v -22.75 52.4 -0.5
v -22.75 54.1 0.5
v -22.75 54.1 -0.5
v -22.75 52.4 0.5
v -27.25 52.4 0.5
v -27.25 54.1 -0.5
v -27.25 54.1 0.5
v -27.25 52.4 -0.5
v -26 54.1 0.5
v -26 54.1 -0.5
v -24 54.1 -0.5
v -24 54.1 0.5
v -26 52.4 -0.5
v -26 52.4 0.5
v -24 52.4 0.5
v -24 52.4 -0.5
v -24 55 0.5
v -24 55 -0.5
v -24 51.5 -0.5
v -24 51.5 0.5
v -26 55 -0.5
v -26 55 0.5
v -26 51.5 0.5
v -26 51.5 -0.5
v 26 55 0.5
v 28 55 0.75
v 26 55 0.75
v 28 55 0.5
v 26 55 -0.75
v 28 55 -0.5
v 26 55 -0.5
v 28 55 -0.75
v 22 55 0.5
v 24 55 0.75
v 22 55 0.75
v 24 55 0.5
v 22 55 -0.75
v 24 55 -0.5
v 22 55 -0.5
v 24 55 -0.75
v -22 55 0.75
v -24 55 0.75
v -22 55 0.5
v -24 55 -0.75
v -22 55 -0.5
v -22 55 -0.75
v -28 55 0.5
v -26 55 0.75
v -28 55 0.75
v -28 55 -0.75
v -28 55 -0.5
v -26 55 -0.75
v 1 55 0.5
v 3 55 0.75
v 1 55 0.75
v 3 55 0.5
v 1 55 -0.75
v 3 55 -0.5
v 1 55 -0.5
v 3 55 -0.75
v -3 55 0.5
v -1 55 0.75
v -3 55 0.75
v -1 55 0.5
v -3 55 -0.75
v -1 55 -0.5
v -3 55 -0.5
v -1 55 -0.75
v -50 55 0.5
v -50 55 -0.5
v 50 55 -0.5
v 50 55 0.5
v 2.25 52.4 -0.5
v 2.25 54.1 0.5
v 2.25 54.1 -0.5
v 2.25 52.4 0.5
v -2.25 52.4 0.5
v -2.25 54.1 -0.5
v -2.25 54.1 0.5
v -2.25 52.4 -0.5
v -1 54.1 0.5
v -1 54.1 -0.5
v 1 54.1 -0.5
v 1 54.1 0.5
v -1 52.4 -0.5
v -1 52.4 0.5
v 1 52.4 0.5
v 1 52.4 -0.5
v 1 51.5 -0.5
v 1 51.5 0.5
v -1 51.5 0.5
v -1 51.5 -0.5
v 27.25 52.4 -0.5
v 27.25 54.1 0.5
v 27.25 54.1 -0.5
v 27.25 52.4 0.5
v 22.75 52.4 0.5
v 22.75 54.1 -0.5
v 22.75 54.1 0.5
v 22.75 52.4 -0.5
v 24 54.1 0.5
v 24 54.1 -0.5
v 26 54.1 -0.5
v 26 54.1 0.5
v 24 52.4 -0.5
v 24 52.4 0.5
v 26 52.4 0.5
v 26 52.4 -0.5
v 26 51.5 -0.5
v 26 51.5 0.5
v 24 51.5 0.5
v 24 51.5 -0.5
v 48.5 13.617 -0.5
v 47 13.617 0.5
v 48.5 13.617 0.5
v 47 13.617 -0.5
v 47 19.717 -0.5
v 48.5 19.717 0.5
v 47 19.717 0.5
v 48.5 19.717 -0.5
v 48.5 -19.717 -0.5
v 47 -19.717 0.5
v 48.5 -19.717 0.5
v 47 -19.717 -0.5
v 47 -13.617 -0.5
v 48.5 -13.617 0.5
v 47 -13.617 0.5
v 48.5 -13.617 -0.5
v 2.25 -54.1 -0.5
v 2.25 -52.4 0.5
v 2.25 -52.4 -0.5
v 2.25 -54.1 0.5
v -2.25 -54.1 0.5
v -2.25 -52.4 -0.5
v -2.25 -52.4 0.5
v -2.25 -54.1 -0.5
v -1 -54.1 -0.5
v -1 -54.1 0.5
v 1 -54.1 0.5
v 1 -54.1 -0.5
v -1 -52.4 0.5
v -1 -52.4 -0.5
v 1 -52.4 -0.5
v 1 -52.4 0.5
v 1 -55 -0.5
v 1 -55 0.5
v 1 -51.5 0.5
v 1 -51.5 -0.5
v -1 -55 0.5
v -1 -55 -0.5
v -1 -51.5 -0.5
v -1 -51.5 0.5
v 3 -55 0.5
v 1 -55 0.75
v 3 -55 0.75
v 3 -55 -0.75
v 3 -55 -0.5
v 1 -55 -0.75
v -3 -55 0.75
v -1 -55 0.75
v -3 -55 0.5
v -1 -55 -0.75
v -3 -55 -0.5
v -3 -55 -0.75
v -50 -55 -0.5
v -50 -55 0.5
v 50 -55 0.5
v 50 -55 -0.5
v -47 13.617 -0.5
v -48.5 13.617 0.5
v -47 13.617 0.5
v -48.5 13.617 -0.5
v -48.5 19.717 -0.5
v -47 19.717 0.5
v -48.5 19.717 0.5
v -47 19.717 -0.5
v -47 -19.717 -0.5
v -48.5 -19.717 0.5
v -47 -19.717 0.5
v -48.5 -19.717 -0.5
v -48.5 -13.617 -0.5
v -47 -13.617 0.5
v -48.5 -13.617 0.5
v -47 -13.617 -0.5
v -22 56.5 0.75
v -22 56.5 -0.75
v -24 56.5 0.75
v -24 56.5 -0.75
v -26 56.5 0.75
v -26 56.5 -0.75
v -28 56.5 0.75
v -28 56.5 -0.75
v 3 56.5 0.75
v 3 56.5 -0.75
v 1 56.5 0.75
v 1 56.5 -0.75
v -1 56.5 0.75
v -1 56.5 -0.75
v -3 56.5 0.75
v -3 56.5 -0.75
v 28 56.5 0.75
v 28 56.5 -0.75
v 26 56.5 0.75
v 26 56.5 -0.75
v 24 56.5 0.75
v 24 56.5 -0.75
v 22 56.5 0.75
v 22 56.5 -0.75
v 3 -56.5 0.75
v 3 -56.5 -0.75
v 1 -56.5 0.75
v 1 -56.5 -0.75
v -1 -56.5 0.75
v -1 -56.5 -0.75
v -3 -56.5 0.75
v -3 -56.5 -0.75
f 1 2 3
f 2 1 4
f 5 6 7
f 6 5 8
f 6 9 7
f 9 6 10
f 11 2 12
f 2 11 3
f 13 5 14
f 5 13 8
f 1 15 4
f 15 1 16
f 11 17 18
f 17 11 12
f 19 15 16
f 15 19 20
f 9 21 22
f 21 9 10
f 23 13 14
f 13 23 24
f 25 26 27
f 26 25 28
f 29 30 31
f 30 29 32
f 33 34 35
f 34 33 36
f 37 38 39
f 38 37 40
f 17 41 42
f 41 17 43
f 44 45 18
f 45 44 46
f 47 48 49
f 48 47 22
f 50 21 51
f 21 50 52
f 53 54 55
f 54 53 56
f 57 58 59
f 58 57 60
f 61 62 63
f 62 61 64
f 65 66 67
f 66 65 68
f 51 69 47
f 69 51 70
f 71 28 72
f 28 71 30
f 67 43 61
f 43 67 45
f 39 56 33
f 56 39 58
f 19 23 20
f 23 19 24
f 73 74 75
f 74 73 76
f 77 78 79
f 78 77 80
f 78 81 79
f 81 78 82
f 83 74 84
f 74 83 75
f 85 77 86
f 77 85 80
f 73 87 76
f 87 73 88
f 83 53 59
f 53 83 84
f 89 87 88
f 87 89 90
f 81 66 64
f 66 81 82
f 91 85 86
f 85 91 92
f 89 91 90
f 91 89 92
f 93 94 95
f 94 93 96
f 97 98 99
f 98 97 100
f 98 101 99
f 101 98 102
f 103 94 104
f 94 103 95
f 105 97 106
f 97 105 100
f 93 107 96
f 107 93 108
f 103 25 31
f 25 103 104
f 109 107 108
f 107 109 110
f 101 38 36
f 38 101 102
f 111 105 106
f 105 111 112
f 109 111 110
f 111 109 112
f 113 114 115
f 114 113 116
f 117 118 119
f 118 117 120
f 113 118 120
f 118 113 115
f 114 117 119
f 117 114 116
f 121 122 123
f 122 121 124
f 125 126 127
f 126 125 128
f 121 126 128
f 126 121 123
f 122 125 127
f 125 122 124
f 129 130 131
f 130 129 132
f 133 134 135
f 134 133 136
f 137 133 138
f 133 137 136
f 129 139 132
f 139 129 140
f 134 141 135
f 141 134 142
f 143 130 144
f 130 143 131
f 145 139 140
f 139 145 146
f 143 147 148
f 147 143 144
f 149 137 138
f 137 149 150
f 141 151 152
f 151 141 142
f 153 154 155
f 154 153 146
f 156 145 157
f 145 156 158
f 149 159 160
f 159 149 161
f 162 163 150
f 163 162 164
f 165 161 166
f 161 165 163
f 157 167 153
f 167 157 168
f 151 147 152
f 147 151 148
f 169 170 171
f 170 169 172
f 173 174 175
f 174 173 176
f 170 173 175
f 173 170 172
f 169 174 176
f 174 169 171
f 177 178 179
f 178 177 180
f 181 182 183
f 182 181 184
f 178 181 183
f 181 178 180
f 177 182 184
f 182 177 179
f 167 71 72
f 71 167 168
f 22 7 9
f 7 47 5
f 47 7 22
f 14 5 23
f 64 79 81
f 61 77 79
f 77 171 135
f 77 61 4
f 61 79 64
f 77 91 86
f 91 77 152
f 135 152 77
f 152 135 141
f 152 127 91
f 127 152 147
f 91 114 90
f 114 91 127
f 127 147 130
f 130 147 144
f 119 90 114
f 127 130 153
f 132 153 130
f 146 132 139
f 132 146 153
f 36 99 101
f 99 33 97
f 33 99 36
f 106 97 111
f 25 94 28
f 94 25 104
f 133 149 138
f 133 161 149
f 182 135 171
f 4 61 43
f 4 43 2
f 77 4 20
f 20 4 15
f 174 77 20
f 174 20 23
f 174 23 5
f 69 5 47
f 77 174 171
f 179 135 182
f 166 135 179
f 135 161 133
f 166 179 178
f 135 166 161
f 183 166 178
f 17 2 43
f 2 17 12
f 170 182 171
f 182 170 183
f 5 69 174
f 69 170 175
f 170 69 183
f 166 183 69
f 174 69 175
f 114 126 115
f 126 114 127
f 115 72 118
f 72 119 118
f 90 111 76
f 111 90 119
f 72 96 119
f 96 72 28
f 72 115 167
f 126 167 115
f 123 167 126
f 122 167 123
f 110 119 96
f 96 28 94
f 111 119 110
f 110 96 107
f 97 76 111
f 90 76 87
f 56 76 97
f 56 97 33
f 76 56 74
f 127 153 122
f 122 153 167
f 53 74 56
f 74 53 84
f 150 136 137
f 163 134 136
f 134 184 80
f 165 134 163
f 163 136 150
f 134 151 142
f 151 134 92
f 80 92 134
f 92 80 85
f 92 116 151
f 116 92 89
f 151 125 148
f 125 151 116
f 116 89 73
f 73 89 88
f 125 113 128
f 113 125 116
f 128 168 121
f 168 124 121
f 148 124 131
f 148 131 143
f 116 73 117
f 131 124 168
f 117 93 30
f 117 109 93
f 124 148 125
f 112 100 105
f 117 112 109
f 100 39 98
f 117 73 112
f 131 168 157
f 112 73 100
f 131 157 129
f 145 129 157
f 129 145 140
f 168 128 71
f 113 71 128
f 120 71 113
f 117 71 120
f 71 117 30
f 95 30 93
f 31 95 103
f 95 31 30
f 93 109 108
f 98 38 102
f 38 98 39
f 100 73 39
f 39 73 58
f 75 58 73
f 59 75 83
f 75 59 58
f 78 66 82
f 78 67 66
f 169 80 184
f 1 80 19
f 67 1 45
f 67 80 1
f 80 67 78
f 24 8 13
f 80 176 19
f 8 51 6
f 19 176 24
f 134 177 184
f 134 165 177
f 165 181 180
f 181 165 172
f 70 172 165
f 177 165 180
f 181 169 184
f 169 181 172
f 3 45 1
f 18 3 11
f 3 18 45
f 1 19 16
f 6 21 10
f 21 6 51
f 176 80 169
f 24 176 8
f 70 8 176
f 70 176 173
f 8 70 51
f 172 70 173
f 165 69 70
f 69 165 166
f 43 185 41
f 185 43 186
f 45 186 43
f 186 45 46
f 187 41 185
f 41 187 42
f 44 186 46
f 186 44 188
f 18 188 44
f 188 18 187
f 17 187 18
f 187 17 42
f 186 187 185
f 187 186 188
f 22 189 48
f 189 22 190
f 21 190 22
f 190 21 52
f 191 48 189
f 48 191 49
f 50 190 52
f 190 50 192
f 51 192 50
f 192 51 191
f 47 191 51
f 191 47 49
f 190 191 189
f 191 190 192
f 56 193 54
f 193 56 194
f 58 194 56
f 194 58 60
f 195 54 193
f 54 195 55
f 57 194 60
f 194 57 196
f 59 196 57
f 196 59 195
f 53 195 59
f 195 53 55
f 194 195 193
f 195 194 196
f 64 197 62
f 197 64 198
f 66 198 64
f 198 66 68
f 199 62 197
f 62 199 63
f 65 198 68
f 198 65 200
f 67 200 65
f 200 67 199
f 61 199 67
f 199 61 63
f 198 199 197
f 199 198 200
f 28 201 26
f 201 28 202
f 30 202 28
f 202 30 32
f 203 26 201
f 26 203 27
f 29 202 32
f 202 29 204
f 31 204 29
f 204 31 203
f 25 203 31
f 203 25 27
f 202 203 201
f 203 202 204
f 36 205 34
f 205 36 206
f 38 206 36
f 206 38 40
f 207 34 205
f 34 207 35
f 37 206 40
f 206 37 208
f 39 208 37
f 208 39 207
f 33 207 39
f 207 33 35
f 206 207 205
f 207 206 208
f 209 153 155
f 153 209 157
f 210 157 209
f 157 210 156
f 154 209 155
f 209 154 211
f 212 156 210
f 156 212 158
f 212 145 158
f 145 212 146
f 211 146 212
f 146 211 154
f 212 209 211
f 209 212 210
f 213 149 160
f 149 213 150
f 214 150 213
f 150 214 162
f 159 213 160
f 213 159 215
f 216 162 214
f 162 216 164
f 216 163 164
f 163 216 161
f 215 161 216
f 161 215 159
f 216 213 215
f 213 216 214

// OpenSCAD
///////////////////////////////////////////////////////////
/// Copyright 2013 Ross Hendrickson
///
///  BSD License
///
/////////////////////////////////////////////////////////

test();

///////////////////////////
//Customizer Variables
///////////////////////////

material_z = 1.5;

retain_screw_od = 2;
retain_screw_height = 5;

retain_nut_od = 4.5;
retain_nut_height = 1.7;
anchor_width = 2;

//Position where the nut should be in the channel
channel_top = 0.5;
channel_bottom = 1 - channel_top;

////////////////////////////////
//Non-Customizer Variables
////////////////////////////////

//Related to anchors and harbors
buffer = 0.1;
anchor_target_width = material_z;
harbor_offset = material_z;
harbor_width = anchor_width*2 + retain_screw_od + buffer;

module test()
{
	//North, East, South, West
	pylons = [3,2,1,2];
	types = [1,0,1,0];
	offsets = [0,0,0,0];
	offcenters = [0,0,0,0];
	generate_cube([100,110,1], true, pylons, types, offsets, offcenters);	
}

module generate_negative_grid(dim, p, t, offsets = [0,0,0,0],  offcenters = [0,0,0,0])
{
	cube_x = dim[0];
	cube_y = dim[1];
	side_off = cube_y - cube_x;

	for ( i = [ 0 : 3 ] )
	{
		if ( t[i] == 1)
		{
		echo("POSITIVE:" ,p[i]);
		//North
		if ( i == 0)
		{
			echo("OFFCENTERS: ", offcenters[i]);
			translate([offcenters[i],0,0])
			generate_shafts(cube_x + offsets[0], cube_y, p[i]); 
		}
		
		//East
		if ( i == 1)
		{
			echo("OFFCENTERS: ", offcenters[i]);
			translate([-side_off/2,0,0])
			rotate([0,0,270])
			translate([offcenters[i],0,0])
			generate_shafts(cube_x + offsets[i], cube_y, p[i]); 
		}

		//South
		if ( i == 2)
		{
			echo("OFFCENTERS: ", offcenters[i]);
			mirror([0,1,0])
			translate([offcenters[i],0,0])
			generate_shafts(cube_x + offsets[i], cube_y, p[i]); 
		}

		//West
		if ( i == 3)
		{
			echo("OFFCENTERS: ", offcenters[i]);
			
			translate([side_off/2,0,0])
			mirror([1,0,0])
			rotate([0,0,-90])
			translate([offcenters[i],0,0])
			generate_shafts(cube_x + offsets[i], cube_y, p[i]); 
		}
		
	////////////////
		}else{
	////////////////
		echo("NEGATIVE", p[i]);
		//North
		if ( i == 0)
		{
			echo("OFFCENTERS: ", offcenters[i]);
			translate([offcenters[i],0,0])
			generate_harbors(cube_x + offsets[i], cube_y, p[i]); 
		}
		
		//East
		if ( i == 1)
		{
			echo("OFFCENTERS: ", offcenters[i]);
			
			translate([-side_off/2,0,0])
			rotate([0,0,270])
			translate([offcenters[i],0,0])
			generate_harbors(cube_x + offsets[i], cube_y, p[i]); 
		}

		//South
		if ( i == 2)
		{
			echo("OFFCENTERS: ", offcenters[i]);
			
			mirror([0,1,0])
			translate([offcenters[i],0,0])
			generate_harbors(cube_x + offsets[i], cube_y, p[i]); 
		}

		//West
		if ( i == 3)
		{
			echo("OFFCENTERS: ", offcenters[i]);
			translate([side_off/2,0,0])
			mirror([1,0,0])
			rotate([0,0,-90])
			translate([offcenters[i],0,0])
			generate_harbors(cube_x + offsets[i], cube_y, p[i]); 
		}

		}

	}

}


module generate_positive_grid(dim, p, t, offsets = [0,0,0,0], offcenters = [0,0,0,0])
{
	cube_x = dim[0];
	cube_y = dim[1];
	side_off = cube_y - cube_x;
	echo("OFFCENTERS_POSITIVE: ", offcenters);
	echo("OFFSETS", offsets);
	for ( i = [ 0 : 3 ] )
	{
		if ( t[i] == 1)
		{
		//North
		if ( i == 0)
		{
			translate([offcenters[i],0,0])
			generate_anchors(cube_x + offsets[0], cube_y, p[i]); 
			
		}
		
		//East
		if ( i == 1)
		{
			translate([-side_off/2,0,0])
			rotate([0,0,270])
			translate([offcenters[i],0,0])
			generate_anchors(cube_x + offsets[i], cube_y, p[i]); 		
		}

		//South
		if ( i == 2)
		{
			mirror([0,1,0])
			translate([offcenters[i],0,0])
			generate_anchors(cube_x + offsets[i], cube_y, p[i]); 		
		}

		//West
		if ( i == 3)
		{
			translate([side_off/2,0,0])
			mirror([1,0,0])
			rotate([0,0,-90])
			translate([offcenters[i],0,0])
			generate_anchors(cube_x + offsets[i], cube_y, p[i]); 
		}
		}
	}

}

module generate_cube(dim, centered, points, types, offsets = [0,0,0,0], offcenters = [0,0,0,0])
{
	
	x = dim;
	y = dim;
	z = dim;

	if ( len(dim) > 1 )
	{
		assign( x = dim[0], y = dim[1], z = dim[2])
		{
			gen_cube(x , y, z, centered, points, types, offsets, offcenters);
		}
		
	}else{
		assign(x = dim, y = dim, z = dim)
		{
			gen_cube(x, y, z, centered,  points, types, offsets, offcenters);
		}
	}
	
	
}

module gen_cube(x, y , z, centered, points, types, offsets = [0,0,0,0], offcenters = [0,0,0,0] )
{
	union(){
	difference(){
	
	cube([x,y,z], center = centered);
	
	//difference out shafts
	//difference out harbor
		generate_negative_grid([x,y,z], points, types, offsets, offcenters);
	}
	//union anchors
		generate_positive_grid([x,y,z], points, types, offsets, offcenters);
	}
}


module generate_anchors(c_x, c_y, num)
{
	width = c_x / (num + 1);

	reset_y = (c_y/2);
	reset_x =  (width * (num-1))/2;

	if ( num > 0)
	{
	translate([-reset_x,reset_y,0])
	gen_anchor_span(c_x, c_y, num);
	}
}

module gen_anchor_span(c_x, c_y, num)
{
	width = c_x / (num + 1);
	
	number = num -1;
	for ( x = [0 : number ])
	{
		translate([ width * x,0,0])
		anchors();
	}
}




module generate_harbors(c_x, c_y, num){
	
	width = c_x / (num + 1);
	//if the harbor is going to go into a thicker target modify anchor_target_width
	reset_y = (c_y/2) - anchor_target_width/2 - harbor_offset;
	reset_x =  (width * (num-1))/2;

	if(num > 0)
	{
	translate([-reset_x,reset_y,0])
	gen_harbor_span(c_x, c_y, num);
	}
}

module gen_harbor_span(c_x, c_y, num){
	
	width = c_x / (num + 1);
	number = num -1;
	for ( x = [0 : number ])
	{
		translate([ width * x,0,0])
		harbor();
	}

}

module generate_shafts(c_x, c_y, num){

width = c_x / (num + 1);

	reset_y = (c_y/2);
	reset_x =  (width * (num-1))/2;

	translate([-reset_x,reset_y,0])
	if( num > 0)
	{

	
	gen_shaft_span(c_x, c_y, num);
	}

}

module gen_shaft_span(c_x, c_y, num){
	
	width = c_x / (num + 1);
	
	number = num -1;
	for ( x = [0 : number ])
	{
		translate([ width * x,0,0])
		shaft();
	}

}



module base(){

	cube([cube_x, cube_y, 4], center = true);
}

module generate_retaining_nut(c_x, c_y, p, t){

	for ( i = [ 0 : 3 ] )
	{
		if ( t[i] == 1)
		{
		echo("POSITIVE:" ,p[i]);

		generate_pylons(c_x, c_y, p[i]);
		
		}else{
		echo("NEGATIVE", p[i]);
		}

	}

}

module fake_pylon()
{
	cube(pylon_width, center = true);
}



module anchors()
{
	y_off =  retain_screw_height/2 + anchor_target_width/2;
	translate([0,- retain_screw_height/2,0])
	union(){
	
	translate([retain_screw_od/2 + anchor_width/2, y_off, 0])
	color("Red")
	cube([anchor_width, anchor_target_width, material_z], center = true);
	
	translate([-(retain_screw_od/2 + anchor_width/2), y_off, 0])
	color("Orange")
	cube([anchor_width, anchor_target_width, material_z], center = true);
	}
}

module shaft(){

	translate([0, - (retain_screw_height - anchor_target_width)/2,0])
	union()
	{
	//nut trap
	translate([0, -((retain_screw_height - anchor_target_width )/2 - ((retain_screw_height - anchor_target_width ) * channel_bottom)), 0])
	cube([retain_nut_od, retain_nut_height, material_z], center = true);

	//main pillar
	color("Blue")
	cube([retain_screw_od, retain_screw_height - anchor_target_width, material_z], center = true);

	}
}

module pylon()
{
	union()
	{
	translate([0, - (retain_screw_height - anchor_target_width)/2,0])
	shaft();
	translate([0,- retain_screw_height/2,0])
	anchors();
	}
	
}

module harbor()
{
	color("White")
	cube([harbor_width, anchor_target_width, material_z], center = true);
}


module main()
{
	translate([0, cube_y + 5, 0])
	color("Brown")
	difference()
	{
	cube([cube_x, cube_y/1.25, anchor_target_width], center = true);
	translate([0, (cube_y/2) , 0]) 
	harbor();
	}
	
	union()
	{
	difference()
	{
	cube([cube_x,cube_y,material_z], center = true);
	translate([0,(cube_y/2),0])
	shaft();
	}

	translate([0,(cube_y/2),0])
	anchors();
	}
}
